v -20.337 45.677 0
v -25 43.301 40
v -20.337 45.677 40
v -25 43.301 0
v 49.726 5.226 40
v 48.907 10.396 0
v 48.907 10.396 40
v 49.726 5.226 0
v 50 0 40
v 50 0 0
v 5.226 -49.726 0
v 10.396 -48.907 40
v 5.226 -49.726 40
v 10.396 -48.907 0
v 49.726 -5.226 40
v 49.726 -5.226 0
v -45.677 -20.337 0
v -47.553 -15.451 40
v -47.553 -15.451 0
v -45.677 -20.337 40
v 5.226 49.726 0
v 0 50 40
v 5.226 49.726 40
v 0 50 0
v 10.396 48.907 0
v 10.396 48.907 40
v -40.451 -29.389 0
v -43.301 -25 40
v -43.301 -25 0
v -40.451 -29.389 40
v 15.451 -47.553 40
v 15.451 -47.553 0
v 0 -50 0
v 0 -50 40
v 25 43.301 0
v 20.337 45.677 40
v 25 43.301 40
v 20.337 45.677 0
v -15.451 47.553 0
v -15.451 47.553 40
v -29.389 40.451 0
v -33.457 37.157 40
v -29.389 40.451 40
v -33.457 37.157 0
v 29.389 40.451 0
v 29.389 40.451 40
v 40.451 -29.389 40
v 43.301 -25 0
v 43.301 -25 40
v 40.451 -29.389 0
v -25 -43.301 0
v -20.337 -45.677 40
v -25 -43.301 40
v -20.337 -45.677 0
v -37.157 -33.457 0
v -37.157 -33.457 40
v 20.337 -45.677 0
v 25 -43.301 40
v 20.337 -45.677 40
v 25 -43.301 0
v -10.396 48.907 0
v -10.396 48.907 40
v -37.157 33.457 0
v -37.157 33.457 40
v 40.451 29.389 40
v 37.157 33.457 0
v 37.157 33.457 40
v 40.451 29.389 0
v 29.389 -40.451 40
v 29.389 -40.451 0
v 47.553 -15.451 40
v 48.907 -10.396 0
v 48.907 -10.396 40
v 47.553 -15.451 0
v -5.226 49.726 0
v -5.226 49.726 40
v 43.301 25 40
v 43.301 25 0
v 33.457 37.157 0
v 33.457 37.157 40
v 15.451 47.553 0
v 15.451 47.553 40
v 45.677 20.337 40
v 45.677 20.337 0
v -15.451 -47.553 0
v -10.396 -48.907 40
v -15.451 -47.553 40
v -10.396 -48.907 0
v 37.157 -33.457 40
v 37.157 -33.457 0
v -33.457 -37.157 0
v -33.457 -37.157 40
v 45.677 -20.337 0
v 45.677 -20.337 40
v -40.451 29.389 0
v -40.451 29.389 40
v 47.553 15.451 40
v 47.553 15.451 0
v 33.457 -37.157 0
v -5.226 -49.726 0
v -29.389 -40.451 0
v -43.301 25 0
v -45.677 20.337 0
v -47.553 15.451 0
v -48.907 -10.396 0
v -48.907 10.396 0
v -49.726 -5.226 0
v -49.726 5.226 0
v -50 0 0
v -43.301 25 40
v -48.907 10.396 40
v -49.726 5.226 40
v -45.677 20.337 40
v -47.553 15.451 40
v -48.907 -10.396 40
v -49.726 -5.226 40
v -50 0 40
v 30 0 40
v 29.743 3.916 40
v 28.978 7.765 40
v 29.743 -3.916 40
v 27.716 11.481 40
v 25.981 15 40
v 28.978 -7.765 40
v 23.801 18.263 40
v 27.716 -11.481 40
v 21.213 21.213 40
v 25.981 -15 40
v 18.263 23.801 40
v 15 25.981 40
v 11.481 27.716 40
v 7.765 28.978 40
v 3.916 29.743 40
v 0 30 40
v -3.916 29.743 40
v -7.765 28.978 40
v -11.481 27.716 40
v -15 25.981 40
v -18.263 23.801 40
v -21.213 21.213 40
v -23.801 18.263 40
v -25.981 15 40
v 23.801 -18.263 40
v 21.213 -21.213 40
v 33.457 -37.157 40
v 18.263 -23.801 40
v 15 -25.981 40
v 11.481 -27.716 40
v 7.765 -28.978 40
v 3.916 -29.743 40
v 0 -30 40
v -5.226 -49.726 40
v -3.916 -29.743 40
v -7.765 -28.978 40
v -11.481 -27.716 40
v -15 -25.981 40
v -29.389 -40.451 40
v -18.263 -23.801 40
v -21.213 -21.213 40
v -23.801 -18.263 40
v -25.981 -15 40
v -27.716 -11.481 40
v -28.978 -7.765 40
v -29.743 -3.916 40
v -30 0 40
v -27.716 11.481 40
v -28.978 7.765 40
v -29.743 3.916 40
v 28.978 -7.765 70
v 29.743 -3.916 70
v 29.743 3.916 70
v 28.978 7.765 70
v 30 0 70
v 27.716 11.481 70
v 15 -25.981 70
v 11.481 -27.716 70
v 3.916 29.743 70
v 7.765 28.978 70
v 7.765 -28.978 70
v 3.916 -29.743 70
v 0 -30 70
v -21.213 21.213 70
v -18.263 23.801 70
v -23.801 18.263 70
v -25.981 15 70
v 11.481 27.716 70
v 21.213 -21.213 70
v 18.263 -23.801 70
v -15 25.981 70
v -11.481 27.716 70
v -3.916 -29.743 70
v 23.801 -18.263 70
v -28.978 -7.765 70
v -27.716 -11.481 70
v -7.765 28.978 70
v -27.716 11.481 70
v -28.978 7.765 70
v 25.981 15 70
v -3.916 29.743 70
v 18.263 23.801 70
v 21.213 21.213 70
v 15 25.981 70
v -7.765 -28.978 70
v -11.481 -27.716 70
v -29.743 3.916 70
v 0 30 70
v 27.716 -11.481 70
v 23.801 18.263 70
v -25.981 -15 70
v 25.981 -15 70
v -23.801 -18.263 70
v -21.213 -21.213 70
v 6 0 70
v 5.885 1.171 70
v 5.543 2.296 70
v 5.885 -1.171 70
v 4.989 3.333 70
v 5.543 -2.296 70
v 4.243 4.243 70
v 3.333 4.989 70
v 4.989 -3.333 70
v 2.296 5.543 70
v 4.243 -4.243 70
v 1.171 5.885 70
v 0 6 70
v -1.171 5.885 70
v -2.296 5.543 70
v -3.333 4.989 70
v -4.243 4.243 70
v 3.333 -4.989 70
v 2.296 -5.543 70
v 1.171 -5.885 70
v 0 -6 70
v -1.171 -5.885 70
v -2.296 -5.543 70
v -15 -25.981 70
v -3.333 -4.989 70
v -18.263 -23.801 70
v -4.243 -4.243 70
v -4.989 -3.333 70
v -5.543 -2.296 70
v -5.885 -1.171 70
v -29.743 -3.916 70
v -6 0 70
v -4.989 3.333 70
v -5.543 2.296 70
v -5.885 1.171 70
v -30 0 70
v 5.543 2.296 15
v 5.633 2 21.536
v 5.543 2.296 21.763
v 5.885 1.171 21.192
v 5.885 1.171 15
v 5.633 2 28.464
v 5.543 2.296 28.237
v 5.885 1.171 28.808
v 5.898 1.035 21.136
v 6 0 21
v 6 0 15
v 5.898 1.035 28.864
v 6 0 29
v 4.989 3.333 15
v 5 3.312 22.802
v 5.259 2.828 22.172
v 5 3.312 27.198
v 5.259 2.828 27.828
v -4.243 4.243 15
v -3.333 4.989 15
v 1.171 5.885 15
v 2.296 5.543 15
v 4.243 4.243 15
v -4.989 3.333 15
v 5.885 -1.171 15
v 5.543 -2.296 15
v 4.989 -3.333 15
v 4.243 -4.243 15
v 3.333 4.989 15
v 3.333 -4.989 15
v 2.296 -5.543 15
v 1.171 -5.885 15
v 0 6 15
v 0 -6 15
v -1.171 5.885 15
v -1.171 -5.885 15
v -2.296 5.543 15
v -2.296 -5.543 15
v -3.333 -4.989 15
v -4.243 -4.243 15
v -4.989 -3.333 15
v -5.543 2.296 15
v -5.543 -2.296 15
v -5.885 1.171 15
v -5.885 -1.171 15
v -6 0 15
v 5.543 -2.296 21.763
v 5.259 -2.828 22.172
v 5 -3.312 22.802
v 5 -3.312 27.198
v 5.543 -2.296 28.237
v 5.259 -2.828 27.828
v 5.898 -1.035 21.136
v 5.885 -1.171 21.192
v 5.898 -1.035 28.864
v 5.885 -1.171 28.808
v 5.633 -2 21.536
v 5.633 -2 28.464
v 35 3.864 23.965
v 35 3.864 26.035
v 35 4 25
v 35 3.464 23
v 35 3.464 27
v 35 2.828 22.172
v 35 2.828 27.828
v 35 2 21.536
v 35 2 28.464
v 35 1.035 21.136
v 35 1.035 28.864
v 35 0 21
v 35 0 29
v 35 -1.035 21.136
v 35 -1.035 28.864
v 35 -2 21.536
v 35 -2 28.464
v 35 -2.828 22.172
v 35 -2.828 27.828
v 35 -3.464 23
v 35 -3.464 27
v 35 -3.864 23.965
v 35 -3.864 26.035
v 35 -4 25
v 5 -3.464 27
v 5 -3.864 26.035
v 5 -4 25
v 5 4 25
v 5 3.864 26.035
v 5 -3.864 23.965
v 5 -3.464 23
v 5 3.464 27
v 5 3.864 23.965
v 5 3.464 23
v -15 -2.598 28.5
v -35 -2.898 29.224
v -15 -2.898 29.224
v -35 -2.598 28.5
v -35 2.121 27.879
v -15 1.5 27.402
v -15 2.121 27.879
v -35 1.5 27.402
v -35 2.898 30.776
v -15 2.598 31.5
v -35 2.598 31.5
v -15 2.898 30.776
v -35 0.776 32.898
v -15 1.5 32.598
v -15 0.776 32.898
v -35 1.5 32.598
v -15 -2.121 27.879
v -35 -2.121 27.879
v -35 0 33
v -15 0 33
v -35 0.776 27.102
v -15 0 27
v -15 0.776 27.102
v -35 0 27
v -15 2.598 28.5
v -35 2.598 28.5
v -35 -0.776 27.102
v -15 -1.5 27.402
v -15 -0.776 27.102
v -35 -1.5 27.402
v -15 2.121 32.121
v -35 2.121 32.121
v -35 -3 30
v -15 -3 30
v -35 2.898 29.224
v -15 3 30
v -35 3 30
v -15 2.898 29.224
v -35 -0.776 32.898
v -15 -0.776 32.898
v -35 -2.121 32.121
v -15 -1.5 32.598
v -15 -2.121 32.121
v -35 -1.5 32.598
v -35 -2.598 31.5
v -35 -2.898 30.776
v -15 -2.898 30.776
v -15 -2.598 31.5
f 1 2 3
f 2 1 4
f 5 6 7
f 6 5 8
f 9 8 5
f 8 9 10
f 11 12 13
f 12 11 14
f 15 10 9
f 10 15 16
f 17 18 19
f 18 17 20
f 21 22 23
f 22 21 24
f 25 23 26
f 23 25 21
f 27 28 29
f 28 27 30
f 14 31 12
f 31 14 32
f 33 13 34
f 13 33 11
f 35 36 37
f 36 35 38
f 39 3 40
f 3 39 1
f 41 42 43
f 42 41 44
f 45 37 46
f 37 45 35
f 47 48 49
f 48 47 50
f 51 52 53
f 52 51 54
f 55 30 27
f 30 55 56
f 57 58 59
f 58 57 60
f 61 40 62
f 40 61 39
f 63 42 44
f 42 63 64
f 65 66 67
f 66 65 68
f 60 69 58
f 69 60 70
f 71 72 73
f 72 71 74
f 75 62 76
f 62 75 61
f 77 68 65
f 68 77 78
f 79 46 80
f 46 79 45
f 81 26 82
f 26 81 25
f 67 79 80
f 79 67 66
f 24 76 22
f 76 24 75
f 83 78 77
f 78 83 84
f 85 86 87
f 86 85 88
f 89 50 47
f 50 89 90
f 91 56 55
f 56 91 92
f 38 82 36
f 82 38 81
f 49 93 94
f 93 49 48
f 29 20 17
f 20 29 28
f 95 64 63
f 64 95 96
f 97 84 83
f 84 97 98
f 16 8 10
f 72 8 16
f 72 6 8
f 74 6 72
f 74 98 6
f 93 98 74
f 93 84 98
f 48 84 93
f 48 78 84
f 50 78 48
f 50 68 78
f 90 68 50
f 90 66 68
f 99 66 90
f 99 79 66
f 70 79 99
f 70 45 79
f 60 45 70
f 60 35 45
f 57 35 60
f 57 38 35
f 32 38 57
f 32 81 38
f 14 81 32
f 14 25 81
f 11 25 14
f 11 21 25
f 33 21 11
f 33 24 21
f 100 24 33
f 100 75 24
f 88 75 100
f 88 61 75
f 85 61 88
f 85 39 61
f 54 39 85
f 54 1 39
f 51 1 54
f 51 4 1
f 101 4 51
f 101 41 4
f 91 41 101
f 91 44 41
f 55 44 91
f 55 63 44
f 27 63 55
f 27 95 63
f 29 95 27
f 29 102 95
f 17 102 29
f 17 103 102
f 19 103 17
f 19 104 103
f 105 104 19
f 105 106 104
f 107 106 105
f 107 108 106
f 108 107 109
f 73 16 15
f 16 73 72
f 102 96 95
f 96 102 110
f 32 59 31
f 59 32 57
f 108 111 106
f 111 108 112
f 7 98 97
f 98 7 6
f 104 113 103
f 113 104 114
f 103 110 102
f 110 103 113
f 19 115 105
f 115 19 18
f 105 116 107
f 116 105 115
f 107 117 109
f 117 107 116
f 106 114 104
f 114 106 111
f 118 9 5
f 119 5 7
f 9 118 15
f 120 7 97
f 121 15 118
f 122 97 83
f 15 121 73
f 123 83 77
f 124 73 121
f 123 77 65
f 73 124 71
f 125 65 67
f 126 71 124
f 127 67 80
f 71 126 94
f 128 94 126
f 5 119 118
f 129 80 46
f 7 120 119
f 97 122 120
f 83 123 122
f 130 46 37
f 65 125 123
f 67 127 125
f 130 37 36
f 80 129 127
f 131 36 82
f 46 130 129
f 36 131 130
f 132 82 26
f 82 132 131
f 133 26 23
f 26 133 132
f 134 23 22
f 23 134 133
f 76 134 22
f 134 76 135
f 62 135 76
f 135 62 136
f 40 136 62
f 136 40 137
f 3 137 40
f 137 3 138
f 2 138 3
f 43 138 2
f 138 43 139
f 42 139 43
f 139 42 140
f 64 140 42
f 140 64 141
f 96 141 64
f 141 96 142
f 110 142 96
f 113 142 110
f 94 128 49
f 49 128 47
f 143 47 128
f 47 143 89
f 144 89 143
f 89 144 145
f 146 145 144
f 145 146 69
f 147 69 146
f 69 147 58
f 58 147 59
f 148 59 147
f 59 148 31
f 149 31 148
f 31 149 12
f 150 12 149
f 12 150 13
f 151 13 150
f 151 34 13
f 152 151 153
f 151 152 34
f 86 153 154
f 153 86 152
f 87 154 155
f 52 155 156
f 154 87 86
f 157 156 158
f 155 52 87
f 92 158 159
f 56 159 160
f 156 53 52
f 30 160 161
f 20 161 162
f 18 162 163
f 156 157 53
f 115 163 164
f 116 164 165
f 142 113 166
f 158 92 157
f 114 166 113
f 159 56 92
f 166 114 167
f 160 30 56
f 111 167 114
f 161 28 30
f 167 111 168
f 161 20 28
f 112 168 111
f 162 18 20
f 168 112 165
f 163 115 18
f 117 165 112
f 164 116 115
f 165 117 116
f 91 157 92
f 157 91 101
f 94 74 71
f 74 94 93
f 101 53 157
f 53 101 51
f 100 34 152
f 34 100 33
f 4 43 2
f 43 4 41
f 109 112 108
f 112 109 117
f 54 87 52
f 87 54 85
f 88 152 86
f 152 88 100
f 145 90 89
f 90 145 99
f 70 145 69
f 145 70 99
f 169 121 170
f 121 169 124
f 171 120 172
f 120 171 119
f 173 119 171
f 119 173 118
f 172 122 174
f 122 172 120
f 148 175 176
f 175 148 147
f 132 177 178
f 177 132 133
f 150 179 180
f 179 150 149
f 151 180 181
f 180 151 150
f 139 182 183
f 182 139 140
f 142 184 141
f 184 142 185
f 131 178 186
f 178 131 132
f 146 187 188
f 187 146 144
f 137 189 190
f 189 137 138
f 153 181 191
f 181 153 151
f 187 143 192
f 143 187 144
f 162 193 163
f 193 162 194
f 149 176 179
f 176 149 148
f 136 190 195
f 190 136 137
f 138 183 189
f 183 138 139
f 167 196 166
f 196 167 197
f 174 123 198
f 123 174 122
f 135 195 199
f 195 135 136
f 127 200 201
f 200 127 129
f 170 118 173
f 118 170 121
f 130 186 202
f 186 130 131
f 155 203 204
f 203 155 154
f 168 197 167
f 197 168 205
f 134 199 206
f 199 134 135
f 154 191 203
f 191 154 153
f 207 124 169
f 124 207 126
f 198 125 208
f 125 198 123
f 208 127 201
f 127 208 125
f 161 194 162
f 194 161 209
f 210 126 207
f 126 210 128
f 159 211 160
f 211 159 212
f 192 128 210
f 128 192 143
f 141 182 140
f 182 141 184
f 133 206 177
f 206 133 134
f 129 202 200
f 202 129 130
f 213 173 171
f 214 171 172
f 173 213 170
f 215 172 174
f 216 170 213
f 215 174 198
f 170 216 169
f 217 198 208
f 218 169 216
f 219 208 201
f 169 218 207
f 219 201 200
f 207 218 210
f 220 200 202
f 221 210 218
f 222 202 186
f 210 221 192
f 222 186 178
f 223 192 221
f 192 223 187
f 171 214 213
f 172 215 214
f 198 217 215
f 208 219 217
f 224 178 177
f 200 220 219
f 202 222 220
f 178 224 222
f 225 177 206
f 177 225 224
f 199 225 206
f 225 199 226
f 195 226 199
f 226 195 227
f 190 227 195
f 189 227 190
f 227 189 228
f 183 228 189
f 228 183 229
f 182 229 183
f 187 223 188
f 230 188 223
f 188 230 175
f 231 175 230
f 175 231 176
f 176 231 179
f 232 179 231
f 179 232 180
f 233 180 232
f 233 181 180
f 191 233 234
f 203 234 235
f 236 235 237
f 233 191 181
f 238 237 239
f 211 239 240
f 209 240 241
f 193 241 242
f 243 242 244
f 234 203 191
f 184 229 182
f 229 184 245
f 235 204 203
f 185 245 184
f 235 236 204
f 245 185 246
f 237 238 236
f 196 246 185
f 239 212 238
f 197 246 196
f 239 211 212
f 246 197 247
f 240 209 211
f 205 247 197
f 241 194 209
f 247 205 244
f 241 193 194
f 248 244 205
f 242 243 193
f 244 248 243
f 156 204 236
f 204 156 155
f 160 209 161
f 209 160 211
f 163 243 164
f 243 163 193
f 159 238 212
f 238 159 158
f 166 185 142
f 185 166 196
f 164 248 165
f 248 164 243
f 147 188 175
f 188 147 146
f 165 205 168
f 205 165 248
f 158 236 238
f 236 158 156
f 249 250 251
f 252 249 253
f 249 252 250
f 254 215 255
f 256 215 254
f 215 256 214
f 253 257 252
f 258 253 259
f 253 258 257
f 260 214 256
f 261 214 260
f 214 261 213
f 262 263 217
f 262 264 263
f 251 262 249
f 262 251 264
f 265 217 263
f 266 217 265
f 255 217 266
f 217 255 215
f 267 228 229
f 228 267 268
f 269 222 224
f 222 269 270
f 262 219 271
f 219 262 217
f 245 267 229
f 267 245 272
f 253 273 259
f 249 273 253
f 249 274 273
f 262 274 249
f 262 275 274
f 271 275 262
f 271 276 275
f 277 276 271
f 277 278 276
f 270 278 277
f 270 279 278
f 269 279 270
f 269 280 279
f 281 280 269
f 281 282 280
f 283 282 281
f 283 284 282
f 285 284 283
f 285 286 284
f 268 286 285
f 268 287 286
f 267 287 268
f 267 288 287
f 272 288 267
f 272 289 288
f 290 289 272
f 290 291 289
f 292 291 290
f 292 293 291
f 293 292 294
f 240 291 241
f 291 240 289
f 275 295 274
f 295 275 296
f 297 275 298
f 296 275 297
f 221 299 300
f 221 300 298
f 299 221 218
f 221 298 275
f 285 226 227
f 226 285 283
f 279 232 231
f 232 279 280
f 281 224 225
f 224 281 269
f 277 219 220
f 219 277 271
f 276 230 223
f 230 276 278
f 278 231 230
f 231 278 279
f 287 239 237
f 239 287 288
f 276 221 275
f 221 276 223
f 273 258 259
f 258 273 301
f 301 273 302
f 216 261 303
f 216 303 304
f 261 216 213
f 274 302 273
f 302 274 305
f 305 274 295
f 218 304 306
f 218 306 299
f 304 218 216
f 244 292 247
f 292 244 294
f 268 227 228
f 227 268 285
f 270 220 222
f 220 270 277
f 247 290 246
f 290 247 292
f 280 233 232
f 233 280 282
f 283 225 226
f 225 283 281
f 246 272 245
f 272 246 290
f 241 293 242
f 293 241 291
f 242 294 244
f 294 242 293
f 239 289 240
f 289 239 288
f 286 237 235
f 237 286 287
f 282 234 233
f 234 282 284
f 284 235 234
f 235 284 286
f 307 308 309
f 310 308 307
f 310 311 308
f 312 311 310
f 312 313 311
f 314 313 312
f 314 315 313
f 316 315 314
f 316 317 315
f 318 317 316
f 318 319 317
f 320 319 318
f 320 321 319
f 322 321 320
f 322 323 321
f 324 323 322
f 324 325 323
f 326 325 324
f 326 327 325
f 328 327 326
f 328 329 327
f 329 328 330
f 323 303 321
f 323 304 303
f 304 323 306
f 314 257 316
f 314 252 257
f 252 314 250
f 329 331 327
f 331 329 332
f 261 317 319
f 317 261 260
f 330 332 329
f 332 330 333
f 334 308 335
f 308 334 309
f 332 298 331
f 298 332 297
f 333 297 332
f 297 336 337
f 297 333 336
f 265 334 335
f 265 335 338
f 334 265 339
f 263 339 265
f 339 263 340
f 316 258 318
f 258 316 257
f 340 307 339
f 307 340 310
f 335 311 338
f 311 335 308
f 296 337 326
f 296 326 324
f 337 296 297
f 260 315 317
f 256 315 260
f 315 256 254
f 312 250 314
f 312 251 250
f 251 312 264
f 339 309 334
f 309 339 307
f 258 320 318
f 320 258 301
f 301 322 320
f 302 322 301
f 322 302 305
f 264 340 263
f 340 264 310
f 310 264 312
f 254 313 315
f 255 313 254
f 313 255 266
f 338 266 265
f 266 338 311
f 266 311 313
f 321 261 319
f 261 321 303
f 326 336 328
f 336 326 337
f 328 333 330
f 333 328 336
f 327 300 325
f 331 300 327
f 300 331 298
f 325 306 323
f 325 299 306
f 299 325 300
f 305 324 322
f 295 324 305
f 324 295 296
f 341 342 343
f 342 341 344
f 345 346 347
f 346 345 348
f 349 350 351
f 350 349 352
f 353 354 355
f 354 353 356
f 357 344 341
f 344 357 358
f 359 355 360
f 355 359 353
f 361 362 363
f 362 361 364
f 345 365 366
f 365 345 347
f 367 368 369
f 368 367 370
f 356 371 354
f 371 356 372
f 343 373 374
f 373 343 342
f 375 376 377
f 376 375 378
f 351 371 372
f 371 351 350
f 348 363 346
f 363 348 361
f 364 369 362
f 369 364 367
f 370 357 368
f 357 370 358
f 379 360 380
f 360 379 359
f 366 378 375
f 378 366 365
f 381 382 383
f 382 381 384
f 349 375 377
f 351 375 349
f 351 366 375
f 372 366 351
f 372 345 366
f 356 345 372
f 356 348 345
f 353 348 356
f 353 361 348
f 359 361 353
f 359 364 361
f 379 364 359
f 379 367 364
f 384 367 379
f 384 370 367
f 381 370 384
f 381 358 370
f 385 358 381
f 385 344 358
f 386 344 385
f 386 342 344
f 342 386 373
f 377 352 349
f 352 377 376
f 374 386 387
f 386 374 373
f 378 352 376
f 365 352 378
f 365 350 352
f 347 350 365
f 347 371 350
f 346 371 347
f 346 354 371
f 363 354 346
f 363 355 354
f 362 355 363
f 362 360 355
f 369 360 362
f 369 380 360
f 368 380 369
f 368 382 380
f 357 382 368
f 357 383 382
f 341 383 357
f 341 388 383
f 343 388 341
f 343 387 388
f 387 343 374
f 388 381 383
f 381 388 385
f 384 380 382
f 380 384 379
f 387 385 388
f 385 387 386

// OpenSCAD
// file: lib/generated_constants.scad
// AUTO-GENERATED from simulation/sizing.py — do not hand edit
P_target_W = 10.0;
A_mem_m2 = 0.72;
active_w = 200.0;
active_h = 300.0;
n_plates = 12;
housing_od = 280.0;
housing_len = 264;
bolt_circle = 240.0;
frame_L = 664;
frame_W = 480.0;
frame_H = 900;
delta_P_bar = 34.58;
plate_pitch = 12;
// main file
// Micro-hydro / Pelton test housing
include <lib/generated_constants.scad>

module turbine_housing() {
  difference() {
    union() {
      cylinder(h=40, d=100, $fn=60);
      translate([0, 0, 40]) cylinder(h=30, d=60, $fn=48);
    }
    translate([0, 0, 15]) cylinder(h=60, d=12, $fn=32);
    translate([35, 0, 25]) rotate([0, -90, 0]) cylinder(h=30, d=8, $fn=24);
    // nozzle jet from draw manifold
    translate([-35, 0, 30]) rotate([0, 90, 0]) cylinder(h=20, d=6, $fn=24);
  }
}
turbine_housing();
